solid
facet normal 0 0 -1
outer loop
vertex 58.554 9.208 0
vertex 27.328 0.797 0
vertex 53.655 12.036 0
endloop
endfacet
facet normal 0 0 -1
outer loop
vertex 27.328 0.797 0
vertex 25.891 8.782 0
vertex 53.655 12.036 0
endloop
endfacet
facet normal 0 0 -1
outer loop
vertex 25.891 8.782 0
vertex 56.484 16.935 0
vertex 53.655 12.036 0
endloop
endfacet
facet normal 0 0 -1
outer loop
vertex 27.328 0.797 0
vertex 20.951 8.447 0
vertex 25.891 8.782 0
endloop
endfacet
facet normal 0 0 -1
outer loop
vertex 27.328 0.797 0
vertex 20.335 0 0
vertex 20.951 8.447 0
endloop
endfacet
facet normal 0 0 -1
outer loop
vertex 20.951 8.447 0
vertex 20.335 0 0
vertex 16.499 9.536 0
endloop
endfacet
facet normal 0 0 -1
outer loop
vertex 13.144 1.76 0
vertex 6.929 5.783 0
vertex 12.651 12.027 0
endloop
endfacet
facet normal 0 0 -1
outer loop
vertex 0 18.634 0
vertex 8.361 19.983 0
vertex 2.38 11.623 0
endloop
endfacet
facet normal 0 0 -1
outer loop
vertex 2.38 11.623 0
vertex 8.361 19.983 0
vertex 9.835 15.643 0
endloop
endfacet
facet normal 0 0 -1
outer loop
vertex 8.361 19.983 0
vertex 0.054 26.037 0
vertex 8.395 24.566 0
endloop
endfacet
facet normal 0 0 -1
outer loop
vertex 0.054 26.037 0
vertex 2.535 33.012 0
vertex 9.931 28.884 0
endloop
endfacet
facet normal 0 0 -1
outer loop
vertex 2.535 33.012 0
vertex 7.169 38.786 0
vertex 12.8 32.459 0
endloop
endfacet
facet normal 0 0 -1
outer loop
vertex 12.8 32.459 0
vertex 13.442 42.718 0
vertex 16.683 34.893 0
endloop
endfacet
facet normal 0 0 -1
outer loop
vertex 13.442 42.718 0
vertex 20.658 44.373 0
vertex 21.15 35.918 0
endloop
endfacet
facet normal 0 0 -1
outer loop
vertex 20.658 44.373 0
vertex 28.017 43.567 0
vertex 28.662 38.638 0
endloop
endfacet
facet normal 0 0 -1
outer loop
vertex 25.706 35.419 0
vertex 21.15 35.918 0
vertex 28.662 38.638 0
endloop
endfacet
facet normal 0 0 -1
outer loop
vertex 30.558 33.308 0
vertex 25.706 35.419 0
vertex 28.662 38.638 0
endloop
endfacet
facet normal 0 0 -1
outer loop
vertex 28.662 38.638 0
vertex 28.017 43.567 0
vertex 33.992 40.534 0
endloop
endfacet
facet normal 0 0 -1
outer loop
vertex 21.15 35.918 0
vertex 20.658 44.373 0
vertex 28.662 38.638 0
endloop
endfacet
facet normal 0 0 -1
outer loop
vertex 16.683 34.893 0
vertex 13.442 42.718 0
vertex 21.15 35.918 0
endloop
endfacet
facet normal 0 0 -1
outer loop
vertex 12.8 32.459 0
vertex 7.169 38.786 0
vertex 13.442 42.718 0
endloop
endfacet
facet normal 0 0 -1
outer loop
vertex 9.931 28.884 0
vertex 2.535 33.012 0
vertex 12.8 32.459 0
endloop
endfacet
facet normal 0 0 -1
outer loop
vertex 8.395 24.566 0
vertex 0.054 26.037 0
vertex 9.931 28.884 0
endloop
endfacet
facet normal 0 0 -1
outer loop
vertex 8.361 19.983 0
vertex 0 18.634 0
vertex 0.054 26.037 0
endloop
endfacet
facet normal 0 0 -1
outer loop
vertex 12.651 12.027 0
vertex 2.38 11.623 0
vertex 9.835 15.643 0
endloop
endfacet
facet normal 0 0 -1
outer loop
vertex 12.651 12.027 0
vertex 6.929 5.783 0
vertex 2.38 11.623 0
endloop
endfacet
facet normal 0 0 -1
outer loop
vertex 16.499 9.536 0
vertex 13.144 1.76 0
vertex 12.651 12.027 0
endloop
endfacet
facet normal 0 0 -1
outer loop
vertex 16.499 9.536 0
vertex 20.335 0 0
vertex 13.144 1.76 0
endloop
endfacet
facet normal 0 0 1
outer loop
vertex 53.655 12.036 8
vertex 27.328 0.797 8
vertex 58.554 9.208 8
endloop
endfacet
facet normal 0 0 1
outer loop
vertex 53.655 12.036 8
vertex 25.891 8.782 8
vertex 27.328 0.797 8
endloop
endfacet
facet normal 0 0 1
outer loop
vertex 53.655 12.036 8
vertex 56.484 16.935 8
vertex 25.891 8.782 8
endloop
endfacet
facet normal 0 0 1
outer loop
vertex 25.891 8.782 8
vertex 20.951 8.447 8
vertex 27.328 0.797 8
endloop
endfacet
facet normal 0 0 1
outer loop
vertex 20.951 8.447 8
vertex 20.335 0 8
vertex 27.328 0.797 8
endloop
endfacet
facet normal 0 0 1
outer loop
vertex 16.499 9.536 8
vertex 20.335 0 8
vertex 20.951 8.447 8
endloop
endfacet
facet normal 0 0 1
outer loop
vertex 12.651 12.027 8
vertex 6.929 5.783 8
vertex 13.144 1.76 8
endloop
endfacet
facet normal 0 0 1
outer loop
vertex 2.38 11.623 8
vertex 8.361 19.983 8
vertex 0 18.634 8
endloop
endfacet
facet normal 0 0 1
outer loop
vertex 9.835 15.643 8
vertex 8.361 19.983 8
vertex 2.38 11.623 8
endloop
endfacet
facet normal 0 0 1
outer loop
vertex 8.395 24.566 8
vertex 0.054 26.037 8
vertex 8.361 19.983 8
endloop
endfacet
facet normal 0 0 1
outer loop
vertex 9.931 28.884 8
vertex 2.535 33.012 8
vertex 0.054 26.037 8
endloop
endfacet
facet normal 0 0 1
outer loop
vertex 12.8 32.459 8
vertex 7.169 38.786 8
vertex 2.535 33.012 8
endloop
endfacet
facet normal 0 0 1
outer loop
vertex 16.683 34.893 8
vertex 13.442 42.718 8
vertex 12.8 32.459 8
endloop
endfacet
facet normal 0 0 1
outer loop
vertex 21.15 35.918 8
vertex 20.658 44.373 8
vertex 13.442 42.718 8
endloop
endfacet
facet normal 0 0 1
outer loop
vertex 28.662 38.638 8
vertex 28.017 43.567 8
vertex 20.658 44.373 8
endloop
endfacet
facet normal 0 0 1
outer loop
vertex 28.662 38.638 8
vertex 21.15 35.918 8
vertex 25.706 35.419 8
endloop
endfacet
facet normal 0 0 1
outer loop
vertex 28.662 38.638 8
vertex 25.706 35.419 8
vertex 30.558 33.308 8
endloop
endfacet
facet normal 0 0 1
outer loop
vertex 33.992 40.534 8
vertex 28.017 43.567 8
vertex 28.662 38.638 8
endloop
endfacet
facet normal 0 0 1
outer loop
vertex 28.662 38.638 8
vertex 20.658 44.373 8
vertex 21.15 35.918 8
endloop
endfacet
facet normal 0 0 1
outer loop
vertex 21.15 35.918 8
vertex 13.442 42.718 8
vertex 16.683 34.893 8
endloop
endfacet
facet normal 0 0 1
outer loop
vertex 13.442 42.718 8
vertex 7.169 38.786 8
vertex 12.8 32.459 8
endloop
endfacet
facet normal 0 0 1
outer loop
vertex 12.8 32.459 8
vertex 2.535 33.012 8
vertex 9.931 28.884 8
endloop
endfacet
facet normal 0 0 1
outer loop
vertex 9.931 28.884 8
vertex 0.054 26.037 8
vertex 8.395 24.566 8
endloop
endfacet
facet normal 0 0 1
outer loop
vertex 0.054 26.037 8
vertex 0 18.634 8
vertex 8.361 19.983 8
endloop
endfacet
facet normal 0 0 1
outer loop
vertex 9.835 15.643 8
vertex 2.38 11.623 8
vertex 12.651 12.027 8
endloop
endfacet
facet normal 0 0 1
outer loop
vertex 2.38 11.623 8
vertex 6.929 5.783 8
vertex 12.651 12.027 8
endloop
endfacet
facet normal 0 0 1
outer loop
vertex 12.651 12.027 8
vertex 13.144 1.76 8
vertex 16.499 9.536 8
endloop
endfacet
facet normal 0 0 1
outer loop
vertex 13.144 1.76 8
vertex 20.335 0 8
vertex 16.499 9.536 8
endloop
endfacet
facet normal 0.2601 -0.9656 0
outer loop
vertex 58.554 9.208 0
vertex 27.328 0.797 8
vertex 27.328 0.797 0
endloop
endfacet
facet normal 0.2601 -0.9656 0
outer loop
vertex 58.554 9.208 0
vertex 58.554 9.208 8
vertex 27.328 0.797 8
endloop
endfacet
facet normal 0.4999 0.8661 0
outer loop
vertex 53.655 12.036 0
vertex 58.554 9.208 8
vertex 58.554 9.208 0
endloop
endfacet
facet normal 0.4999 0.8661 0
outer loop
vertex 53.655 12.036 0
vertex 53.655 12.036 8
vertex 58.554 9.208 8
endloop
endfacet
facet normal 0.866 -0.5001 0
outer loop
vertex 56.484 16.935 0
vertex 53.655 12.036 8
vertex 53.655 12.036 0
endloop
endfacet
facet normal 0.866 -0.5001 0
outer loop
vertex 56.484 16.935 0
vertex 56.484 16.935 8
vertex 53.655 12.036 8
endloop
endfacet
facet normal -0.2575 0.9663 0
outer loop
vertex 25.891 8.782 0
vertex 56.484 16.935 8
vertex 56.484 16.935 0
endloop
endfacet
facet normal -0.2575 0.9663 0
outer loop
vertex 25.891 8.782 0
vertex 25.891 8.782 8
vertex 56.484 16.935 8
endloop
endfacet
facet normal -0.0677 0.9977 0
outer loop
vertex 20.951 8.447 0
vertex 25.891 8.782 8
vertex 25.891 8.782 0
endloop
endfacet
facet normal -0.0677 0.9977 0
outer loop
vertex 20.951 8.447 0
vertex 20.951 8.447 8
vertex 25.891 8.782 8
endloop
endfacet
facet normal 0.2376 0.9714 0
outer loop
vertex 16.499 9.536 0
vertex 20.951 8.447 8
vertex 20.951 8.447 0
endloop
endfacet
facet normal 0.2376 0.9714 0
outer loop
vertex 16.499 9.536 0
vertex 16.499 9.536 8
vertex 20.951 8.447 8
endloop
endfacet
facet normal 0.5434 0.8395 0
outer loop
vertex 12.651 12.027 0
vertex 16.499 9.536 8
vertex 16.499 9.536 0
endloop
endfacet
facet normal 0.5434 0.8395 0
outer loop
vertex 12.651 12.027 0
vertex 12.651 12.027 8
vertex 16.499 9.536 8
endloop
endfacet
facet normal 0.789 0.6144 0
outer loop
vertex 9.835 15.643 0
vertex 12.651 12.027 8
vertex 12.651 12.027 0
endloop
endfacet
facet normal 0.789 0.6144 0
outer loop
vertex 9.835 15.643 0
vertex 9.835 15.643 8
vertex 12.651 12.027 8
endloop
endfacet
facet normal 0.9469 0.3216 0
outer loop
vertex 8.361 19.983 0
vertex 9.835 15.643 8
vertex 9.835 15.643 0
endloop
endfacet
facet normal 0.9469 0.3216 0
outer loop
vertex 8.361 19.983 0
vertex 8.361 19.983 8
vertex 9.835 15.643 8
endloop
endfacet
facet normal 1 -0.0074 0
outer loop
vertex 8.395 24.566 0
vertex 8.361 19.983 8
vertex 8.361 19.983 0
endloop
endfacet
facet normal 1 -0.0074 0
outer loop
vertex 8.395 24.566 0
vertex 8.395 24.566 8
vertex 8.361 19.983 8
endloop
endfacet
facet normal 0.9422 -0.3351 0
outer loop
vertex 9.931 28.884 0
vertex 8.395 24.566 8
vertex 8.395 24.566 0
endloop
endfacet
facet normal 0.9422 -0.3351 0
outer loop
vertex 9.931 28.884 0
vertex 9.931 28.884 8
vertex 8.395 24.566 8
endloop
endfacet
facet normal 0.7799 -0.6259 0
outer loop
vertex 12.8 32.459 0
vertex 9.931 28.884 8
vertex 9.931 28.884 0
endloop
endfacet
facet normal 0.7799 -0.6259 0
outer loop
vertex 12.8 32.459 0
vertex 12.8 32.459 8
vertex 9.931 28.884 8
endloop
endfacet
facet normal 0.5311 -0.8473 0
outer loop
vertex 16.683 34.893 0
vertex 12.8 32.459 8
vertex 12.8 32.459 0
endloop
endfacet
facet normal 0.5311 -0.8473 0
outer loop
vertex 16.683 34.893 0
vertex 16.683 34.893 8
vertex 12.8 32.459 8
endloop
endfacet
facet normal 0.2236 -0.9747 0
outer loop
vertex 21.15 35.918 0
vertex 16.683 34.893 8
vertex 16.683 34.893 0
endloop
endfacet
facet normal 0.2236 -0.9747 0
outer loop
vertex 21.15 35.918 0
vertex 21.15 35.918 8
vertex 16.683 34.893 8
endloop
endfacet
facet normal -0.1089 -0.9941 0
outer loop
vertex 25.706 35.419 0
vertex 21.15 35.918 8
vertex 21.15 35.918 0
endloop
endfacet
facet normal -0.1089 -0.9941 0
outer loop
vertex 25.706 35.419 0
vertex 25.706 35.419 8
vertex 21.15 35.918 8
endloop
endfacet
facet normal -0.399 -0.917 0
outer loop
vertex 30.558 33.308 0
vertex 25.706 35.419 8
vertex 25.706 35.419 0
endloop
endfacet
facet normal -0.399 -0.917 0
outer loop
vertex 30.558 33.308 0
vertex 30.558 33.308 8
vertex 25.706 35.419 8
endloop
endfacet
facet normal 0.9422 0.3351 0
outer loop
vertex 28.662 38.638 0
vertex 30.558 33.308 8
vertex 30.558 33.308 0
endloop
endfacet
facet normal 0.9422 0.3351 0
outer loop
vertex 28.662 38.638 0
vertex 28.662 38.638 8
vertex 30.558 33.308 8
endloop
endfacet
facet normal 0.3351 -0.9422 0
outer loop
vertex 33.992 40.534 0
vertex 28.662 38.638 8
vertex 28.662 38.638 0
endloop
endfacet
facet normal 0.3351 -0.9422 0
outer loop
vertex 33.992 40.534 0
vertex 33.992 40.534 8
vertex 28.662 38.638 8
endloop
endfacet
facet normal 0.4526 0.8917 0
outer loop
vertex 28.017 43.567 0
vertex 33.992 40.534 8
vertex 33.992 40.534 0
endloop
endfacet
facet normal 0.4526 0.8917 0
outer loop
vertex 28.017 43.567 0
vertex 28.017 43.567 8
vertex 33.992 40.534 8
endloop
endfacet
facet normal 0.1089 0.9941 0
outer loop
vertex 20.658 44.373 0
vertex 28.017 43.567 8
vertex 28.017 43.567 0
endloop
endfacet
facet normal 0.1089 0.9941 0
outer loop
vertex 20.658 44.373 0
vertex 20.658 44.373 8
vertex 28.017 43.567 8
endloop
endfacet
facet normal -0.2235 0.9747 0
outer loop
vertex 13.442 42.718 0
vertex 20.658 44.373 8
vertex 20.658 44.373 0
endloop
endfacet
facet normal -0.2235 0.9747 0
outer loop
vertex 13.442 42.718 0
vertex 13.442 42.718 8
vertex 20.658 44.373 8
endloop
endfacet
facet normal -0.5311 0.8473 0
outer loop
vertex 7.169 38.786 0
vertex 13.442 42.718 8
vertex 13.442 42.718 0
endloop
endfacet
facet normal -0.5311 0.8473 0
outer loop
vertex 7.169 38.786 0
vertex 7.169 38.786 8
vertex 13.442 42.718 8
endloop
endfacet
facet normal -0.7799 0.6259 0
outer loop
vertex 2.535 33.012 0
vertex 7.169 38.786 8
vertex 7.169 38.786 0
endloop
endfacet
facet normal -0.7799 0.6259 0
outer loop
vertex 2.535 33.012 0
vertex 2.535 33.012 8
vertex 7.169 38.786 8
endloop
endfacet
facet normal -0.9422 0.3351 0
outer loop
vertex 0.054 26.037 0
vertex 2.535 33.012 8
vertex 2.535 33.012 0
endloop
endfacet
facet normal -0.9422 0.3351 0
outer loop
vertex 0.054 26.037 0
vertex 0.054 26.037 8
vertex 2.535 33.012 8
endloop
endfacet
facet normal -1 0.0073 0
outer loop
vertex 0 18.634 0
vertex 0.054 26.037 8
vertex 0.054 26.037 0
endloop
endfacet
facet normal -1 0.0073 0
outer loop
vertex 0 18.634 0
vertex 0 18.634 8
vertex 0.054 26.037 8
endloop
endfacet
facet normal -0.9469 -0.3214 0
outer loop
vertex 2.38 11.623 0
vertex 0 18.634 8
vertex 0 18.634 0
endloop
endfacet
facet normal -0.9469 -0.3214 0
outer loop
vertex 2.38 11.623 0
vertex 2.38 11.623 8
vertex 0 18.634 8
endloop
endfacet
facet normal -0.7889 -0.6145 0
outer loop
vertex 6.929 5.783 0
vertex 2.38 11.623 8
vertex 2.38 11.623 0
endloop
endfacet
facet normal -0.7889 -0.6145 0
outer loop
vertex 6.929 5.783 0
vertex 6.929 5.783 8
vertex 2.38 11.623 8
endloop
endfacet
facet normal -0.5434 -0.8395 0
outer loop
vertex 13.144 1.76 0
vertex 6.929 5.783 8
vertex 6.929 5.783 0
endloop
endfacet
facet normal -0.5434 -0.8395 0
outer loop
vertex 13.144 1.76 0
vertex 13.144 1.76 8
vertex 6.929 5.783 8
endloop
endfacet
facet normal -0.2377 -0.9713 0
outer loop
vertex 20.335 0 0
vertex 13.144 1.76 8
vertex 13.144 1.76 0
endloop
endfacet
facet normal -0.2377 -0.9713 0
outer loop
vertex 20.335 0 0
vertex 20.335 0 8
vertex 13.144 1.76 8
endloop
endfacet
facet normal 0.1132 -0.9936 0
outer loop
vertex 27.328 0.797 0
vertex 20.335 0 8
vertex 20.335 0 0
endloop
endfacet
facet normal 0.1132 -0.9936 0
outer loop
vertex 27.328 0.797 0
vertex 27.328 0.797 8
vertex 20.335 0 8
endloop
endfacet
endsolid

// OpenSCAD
$fn = 32;

// ----------------------------------------------------------------------
// Eye lug: ring_tail, 8 mm thick
// ----------------------------------------------------------------------

// --- parameters (mm) ---
profile_height = 8;       // extrusion height
profile_points = 30;      // points of the closed outline

profile = [[28.662, 38.638], [33.992, 40.534], [28.017, 43.567], [20.658, 44.373], [13.442, 42.718], [7.169, 38.786], [2.535, 33.012], [0.054, 26.037], [0, 18.634], [2.38, 11.623], [6.929, 5.783], [13.144, 1.76], [20.335, 0], [27.328, 0.797], [58.554, 9.208], [53.655, 12.036], [56.484, 16.935], [25.891, 8.782], [20.951, 8.447], [16.499, 9.536], [12.651, 12.027], [9.835, 15.643], [8.361, 19.983], [8.395, 24.566], [9.931, 28.884], [12.8, 32.459], [16.683, 34.893], [21.15, 35.918], [25.706, 35.419], [30.558, 33.308]];  // single closed polygon, 30 points, counter clockwise

// --- the one profile operation ---
linear_extrude(height = profile_height) polygon(points = profile);
